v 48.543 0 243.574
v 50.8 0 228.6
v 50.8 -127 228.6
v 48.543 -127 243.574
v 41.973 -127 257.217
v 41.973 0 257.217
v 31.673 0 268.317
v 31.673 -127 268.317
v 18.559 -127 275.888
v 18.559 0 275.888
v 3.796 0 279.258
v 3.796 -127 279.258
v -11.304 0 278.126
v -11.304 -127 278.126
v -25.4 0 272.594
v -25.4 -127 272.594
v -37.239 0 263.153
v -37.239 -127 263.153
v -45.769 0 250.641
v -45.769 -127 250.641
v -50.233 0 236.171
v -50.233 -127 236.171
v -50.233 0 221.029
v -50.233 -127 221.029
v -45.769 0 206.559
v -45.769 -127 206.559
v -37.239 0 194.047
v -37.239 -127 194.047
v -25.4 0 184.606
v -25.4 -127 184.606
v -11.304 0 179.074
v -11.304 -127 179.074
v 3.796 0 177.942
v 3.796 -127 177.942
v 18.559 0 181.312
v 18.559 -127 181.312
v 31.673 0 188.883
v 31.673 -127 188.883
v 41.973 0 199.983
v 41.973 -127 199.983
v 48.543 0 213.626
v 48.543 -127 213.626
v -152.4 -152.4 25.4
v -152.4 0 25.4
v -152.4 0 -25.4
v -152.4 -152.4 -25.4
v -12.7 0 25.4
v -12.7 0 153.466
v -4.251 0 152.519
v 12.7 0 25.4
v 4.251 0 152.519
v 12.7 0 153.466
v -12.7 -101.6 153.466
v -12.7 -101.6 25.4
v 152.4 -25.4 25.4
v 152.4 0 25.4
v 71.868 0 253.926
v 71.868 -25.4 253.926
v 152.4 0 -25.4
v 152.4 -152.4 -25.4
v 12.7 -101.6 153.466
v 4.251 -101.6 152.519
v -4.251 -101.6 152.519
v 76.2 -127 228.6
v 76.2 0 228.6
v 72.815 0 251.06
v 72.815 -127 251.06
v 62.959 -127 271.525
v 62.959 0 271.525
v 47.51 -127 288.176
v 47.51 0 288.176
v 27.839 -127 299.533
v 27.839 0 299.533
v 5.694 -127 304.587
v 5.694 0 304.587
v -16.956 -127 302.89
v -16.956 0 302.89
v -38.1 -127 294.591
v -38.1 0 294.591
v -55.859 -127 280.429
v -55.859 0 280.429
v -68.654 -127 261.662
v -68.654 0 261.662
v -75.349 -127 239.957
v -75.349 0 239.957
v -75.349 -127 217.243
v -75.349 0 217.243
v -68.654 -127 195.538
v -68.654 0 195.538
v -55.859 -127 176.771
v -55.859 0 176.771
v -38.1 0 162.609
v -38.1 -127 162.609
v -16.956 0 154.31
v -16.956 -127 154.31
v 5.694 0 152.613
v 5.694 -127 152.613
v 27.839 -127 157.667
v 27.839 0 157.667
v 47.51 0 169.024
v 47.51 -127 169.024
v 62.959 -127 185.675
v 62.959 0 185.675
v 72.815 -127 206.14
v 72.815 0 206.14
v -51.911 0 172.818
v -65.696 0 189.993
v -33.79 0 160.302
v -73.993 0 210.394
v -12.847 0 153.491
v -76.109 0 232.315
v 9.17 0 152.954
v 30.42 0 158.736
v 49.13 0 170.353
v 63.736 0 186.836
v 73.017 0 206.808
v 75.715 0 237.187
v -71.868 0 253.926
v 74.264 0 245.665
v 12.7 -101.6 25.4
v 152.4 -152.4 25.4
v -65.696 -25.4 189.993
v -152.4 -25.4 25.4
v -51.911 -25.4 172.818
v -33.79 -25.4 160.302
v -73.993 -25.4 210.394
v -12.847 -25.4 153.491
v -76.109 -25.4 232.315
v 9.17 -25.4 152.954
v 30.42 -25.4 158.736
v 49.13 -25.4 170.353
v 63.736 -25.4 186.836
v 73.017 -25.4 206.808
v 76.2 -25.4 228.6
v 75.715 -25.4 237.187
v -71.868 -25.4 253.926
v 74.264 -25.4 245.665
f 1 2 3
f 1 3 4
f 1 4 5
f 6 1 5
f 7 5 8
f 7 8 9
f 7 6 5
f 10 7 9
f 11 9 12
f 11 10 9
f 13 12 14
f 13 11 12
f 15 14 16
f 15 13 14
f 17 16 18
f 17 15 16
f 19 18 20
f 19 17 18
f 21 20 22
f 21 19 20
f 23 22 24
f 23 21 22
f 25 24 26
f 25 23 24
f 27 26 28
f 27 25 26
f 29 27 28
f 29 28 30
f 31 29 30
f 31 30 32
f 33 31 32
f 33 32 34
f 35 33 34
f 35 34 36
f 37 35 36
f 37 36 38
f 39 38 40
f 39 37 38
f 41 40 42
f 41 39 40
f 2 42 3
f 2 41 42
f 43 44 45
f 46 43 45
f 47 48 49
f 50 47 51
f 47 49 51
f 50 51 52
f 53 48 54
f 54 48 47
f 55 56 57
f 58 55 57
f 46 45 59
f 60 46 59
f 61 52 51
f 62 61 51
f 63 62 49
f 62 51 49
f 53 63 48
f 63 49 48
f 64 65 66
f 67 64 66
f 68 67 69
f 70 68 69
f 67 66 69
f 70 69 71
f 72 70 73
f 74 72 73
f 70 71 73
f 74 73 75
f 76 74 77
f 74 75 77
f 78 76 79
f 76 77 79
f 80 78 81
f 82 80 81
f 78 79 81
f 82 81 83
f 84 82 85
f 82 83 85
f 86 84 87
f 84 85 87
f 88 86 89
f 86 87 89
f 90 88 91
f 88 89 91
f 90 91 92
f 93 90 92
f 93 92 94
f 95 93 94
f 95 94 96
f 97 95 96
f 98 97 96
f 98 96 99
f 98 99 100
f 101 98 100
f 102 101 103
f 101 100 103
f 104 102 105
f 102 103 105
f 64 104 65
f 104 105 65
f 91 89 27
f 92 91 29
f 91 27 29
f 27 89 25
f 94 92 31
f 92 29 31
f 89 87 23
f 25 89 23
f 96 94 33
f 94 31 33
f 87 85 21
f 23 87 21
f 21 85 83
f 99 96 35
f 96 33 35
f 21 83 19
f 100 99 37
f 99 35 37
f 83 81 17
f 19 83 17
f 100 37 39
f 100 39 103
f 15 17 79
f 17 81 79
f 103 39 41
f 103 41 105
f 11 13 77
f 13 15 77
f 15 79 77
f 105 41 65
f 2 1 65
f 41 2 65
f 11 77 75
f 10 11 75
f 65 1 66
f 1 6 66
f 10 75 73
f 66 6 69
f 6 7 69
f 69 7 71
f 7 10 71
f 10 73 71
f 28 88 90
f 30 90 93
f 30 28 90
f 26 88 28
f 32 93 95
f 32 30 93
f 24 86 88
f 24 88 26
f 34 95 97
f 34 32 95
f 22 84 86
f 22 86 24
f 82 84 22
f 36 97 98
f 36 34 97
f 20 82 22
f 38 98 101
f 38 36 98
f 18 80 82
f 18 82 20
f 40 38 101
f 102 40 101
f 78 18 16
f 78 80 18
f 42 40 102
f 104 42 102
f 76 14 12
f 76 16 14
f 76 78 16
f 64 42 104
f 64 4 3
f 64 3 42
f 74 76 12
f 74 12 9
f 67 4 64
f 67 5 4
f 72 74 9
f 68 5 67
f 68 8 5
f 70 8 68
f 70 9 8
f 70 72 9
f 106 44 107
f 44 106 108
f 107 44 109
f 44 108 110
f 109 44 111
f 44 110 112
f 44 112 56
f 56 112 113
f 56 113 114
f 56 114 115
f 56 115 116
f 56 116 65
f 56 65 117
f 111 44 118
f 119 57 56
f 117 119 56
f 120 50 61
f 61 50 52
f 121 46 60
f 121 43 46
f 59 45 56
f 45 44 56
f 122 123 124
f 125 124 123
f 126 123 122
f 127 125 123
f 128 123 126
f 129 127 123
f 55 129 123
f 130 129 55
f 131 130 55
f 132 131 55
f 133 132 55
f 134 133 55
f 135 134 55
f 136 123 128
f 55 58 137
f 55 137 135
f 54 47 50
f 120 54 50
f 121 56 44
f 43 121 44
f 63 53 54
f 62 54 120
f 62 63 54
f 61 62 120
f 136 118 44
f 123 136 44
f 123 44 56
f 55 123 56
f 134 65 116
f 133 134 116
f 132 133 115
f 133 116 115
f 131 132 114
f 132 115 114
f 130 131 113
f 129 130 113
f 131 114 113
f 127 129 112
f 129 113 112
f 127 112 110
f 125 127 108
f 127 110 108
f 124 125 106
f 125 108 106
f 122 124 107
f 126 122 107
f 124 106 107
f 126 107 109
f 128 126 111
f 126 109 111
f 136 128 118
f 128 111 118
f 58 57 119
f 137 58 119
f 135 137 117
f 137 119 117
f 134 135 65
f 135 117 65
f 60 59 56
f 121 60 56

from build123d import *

# Parameters (mm, degrees)
F1_DEPTH = 152.4
F2_R     = 76.2
F2_R_2   = 50.8
F3_DEPTH = 127
F5_DEPTH = 101.6
F7_DEPTH = 25.4


with BuildPart() as f1:
    # F0 (on Front) → F1 (new body)
    with BuildSketch(Plane.XZ):
        Polygon((-152.4, -25.4), (152.4, -25.4), (152.4, 25.4), (12.7, 25.4), (-12.7, 25.4), (-152.4, 25.4), align=None)
    extrude(amount=F1_DEPTH)


with BuildPart() as f3:
    # F2 (on Front) → F3 (new body)
    with BuildSketch(Plane.XZ):
        with Locations((0, 228.6)):
            Circle(F2_R)
        with Locations((0, 228.6)):
            Circle(F2_R_2, mode=Mode.SUBTRACT)
    extrude(amount=F3_DEPTH)


with BuildPart() as f5:
    # F4 (on Front) → F5 (new body)
    with BuildSketch(Plane.XZ):
        with BuildLine():
            Line((-12.7, 153.465787), (-12.7, 25.4))
            Line((-12.7, 25.4), (12.7, 25.4))
            Line((12.7, 25.4), (12.7, 153.465787))
            ThreePointArc((12.7, 153.465787), (0, 152.4), (-12.7, 153.465787))
        make_face()
    extrude(amount=F5_DEPTH)


with BuildPart() as f7:
    # F6 (on Front) → F7 (new body)
    with BuildSketch(Plane.XZ):
        with BuildLine():
            ThreePointArc((71.868134, 253.9261), (75.109226, 241.446949), (76.2, 228.6))
            ThreePointArc((76.2, 228.6), (-12.846949, 153.490774), (-71.868134, 253.9261))
            Line((-71.868134, 253.9261), (-152.4, 25.4))
            Line((-152.4, 25.4), (152.4, 25.4))
            Line((152.4, 25.4), (71.868134, 253.9261))
        make_face()
    extrude(amount=F7_DEPTH)


solid = Compound([f1.part, f3.part, f5.part, f7.part])
